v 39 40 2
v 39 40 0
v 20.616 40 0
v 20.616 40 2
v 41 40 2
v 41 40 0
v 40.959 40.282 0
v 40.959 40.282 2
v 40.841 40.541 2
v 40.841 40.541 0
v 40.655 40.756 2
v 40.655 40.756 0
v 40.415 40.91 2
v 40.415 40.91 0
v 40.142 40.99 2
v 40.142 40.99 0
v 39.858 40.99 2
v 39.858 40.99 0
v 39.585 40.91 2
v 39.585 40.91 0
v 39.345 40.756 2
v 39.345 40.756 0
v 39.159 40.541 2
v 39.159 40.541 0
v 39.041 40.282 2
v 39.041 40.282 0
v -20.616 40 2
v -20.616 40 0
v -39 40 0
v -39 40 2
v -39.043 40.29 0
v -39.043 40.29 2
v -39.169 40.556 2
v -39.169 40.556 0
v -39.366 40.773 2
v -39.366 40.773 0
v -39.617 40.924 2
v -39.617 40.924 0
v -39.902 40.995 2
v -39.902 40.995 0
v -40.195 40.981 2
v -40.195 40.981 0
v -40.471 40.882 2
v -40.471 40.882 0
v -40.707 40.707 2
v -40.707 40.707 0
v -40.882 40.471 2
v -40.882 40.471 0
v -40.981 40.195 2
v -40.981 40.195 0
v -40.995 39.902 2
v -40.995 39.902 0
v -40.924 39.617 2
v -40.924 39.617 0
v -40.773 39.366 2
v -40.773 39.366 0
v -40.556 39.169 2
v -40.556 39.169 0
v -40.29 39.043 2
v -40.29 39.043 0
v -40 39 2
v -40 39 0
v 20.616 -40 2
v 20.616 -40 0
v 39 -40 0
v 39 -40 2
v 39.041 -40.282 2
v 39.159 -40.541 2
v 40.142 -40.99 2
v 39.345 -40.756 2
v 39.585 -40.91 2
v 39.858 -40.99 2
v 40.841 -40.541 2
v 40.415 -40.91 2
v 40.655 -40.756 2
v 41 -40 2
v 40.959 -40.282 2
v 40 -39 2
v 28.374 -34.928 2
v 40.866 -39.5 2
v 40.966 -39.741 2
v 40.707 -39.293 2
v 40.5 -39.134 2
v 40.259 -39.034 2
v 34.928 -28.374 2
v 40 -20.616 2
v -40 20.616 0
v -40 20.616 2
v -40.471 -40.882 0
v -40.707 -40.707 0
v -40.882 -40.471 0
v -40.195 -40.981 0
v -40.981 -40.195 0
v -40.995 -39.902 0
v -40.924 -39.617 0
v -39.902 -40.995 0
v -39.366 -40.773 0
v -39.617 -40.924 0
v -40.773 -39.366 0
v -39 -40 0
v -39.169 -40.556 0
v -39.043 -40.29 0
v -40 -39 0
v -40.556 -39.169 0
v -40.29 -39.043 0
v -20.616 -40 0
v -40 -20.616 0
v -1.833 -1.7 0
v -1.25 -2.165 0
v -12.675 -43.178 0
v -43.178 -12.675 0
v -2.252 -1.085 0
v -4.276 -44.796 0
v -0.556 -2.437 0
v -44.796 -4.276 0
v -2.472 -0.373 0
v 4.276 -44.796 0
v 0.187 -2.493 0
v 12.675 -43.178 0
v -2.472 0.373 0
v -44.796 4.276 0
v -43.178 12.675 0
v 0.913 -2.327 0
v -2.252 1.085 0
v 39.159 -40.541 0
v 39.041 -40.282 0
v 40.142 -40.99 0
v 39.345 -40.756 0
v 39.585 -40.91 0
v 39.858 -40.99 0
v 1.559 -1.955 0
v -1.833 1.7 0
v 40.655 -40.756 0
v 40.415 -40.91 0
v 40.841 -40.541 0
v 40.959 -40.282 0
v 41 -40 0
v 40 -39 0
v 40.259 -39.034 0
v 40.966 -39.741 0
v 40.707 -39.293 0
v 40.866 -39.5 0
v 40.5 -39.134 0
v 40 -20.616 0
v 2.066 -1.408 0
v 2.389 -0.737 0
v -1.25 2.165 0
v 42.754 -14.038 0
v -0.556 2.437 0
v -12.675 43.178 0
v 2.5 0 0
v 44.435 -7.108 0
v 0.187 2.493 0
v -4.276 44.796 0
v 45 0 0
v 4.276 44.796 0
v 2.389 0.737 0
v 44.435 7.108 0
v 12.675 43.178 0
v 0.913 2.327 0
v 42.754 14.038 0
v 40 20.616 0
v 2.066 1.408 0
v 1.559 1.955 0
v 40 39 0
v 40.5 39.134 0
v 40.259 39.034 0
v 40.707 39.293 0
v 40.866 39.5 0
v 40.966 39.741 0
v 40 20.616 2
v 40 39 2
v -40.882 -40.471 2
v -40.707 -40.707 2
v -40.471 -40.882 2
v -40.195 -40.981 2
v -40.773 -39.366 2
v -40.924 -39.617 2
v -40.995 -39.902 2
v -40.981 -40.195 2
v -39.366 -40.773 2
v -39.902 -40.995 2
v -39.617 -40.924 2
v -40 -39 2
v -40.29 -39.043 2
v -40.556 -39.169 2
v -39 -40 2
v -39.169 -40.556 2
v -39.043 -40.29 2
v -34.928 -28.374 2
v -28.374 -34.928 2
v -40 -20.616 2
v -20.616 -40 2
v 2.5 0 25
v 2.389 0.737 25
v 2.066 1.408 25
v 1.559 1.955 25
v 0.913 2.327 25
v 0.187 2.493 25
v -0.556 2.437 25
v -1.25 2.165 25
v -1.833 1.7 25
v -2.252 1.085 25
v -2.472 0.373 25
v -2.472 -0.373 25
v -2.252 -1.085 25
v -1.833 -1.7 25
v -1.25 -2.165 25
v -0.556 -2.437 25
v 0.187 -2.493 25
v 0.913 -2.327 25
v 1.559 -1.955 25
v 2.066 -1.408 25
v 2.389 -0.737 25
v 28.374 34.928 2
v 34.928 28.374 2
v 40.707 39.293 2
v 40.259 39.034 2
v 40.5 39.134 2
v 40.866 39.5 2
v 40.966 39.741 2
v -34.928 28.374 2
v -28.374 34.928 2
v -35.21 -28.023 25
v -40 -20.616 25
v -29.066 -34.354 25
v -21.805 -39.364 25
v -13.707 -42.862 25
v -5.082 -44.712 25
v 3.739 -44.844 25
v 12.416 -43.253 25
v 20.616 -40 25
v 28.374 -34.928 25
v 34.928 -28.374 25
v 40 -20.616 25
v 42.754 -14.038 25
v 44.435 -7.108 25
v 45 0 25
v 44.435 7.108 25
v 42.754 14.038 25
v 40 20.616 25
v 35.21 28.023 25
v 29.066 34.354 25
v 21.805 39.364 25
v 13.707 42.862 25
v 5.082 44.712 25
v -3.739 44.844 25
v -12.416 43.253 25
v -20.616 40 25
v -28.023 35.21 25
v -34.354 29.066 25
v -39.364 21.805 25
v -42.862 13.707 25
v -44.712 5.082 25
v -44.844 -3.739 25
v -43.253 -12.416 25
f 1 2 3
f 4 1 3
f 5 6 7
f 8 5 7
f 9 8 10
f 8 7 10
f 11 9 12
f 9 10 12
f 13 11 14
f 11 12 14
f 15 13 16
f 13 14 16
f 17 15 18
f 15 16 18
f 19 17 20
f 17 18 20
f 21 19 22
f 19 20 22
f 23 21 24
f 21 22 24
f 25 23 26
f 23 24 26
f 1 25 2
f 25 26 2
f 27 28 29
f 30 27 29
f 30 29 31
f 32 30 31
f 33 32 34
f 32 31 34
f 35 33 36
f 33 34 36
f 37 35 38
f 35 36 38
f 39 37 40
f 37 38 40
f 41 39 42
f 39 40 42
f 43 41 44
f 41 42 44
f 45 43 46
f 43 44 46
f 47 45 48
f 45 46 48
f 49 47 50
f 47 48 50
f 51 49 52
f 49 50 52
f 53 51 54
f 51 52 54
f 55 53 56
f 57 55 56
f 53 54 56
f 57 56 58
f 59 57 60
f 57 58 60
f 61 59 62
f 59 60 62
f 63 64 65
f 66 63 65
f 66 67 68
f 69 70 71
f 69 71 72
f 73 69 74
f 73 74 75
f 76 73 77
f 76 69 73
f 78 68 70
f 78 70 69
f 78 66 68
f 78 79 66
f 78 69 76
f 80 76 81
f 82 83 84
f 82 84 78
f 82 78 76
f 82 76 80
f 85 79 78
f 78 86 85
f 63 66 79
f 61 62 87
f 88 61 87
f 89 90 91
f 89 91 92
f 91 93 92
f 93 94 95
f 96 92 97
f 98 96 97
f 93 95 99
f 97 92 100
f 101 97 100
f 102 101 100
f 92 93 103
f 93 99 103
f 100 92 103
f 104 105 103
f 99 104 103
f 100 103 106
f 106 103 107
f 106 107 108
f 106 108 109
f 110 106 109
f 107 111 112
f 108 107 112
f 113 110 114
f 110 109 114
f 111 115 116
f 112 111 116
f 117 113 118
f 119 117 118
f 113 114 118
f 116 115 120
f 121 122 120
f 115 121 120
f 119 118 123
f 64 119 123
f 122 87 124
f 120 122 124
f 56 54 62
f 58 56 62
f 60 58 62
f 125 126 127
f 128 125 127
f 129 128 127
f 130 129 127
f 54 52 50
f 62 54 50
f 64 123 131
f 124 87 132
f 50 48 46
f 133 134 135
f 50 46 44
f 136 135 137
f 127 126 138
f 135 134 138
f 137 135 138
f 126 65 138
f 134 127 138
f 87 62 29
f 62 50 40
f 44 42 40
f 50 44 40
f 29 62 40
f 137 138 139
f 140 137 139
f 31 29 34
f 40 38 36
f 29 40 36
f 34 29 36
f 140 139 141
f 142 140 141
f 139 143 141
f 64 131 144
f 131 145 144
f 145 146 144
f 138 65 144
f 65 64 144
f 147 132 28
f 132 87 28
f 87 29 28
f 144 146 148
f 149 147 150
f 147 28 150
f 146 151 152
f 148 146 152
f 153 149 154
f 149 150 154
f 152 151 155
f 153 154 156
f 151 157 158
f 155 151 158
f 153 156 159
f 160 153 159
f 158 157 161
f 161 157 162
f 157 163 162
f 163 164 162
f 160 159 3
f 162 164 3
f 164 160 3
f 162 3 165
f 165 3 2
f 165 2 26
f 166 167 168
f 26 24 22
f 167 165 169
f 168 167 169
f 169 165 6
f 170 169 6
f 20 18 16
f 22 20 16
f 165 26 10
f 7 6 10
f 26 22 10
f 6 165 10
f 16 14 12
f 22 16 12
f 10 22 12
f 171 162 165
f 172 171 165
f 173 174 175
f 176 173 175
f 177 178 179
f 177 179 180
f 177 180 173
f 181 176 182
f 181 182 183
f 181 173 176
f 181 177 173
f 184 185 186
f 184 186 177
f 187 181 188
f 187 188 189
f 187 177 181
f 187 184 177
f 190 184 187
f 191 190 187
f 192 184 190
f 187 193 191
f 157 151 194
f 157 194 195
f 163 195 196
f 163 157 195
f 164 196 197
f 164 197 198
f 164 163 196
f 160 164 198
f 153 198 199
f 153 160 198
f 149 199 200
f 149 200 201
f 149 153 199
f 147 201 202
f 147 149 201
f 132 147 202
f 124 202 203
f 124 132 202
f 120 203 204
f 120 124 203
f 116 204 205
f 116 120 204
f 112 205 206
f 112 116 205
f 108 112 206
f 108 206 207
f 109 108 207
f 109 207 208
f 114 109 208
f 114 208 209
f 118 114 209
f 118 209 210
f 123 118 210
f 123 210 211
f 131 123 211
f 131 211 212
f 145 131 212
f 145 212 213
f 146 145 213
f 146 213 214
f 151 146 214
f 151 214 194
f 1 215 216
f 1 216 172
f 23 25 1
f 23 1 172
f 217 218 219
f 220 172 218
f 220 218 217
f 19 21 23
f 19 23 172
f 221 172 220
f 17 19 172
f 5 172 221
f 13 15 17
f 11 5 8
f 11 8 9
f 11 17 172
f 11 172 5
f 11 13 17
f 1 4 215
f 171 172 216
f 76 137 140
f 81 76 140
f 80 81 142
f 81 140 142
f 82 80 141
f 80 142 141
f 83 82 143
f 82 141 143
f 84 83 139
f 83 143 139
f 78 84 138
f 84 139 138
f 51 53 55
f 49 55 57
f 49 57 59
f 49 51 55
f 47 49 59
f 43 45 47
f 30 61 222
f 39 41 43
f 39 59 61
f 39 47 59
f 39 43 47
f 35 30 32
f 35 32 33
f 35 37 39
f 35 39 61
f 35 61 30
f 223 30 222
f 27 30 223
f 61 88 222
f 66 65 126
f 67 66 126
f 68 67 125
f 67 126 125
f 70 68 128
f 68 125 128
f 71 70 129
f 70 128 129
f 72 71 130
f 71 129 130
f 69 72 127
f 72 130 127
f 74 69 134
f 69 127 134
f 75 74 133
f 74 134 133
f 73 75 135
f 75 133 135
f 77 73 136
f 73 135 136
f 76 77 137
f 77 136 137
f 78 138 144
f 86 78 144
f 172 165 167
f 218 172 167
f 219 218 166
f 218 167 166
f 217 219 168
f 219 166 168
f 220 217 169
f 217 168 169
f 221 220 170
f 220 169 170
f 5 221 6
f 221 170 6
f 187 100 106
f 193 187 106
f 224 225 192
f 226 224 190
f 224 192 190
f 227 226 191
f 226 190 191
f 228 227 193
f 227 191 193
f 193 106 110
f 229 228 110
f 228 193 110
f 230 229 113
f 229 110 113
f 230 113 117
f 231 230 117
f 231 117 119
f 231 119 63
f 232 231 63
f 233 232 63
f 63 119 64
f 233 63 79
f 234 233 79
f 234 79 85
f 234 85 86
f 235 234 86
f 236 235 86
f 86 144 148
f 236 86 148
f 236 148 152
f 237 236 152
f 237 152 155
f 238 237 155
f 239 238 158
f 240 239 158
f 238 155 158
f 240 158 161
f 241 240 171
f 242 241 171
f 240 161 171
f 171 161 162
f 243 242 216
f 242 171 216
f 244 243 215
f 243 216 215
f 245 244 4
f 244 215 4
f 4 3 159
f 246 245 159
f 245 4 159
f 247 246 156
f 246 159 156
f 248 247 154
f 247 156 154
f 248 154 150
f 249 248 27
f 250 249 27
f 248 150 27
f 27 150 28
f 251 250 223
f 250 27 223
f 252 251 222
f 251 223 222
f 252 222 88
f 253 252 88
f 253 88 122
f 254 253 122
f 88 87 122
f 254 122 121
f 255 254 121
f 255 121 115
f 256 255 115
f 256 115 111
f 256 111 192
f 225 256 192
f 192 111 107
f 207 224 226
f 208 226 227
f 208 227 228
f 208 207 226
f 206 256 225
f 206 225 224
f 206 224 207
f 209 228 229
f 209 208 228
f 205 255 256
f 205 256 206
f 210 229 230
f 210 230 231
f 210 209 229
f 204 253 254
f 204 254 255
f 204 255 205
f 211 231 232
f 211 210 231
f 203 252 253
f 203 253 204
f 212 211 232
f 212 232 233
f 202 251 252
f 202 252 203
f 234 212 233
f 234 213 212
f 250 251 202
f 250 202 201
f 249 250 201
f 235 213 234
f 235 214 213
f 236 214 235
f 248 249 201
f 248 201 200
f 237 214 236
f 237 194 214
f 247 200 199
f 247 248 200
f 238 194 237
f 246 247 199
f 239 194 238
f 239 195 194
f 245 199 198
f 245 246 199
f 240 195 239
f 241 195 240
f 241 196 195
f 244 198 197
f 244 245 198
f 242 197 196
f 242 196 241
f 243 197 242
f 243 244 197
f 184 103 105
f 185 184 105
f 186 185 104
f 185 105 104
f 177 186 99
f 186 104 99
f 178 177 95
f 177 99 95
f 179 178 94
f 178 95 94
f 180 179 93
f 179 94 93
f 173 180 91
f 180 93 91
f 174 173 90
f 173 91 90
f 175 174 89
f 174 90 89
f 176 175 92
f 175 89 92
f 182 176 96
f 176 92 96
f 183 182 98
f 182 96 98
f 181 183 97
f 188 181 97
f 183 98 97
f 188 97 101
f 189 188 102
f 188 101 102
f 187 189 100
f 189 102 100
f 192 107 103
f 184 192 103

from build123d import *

# Parameters (mm, degrees)
F0_R     = 2.5
F1_DEPTH = 2
F2_DEPTH = 25


# Not quite as in the source:
# - a feature names something its author has since deleted; it is built from what else it names


with BuildPart() as f1:
    # F0 (on Top) → F1 (new body)
    with BuildSketch(Plane.XY):
        with BuildLine():
            ThreePointArc((40, 39), (39.2928932188, 39.2928932188), (39, 40))
            Line((39, 40), (20.6155281281, 40))
            ThreePointArc((20.6155281281, 40), (31.8198051534, 31.8198051534), (40, 20.6155281281))
            Line((40, 20.6155281281), (40, 39))
        make_face()
        with BuildLine():
            ThreePointArc((-40, 20.6155281281), (-31.8198051534, 31.8198051534), (-20.6155281281, 40))
            Line((-20.6155281281, 40), (-39, 40))
            ThreePointArc((-39, 40), (-39.2928932188, 39.2928932188), (-40, 39))
            Line((-40, 39), (-40, 20.6155281281))
        make_face()
        with BuildLine():
            ThreePointArc((-20.6155281281, -40), (-31.8198051534, -31.8198051534), (-40, -20.6155281281))
            Line((-40, -20.6155281281), (-40, -39))
            ThreePointArc((-40, -39), (-39.2928932188, -39.2928932188), (-39, -40))
            Line((-39, -40), (-20.6155281281, -40))
        make_face()
        with BuildLine():
            Line((40, -39), (40, -20.6155281281))
            ThreePointArc((40, -20.6155281281), (31.8198051534, -31.8198051534), (20.6155281281, -40))
            Line((20.6155281281, -40), (39, -40))
            ThreePointArc((39, -40), (39.2928932188, -39.2928932188), (40, -39))
        make_face()
        with BuildLine():
            ThreePointArc((40, 20.6155281281), (31.8198051534, 31.8198051534), (20.6155281281, 40))
            ThreePointArc((20.6155281281, 40), (0, 45), (-20.6155281281, 40))
            ThreePointArc((-20.6155281281, 40), (-31.8198051534, 31.8198051534), (-40, 20.6155281281))
            ThreePointArc((-40, 20.6155281281), (-45, 0), (-40, -20.6155281281))
            ThreePointArc((-40, -20.6155281281), (-31.8198051534, -31.8198051534), (-20.6155281281, -40))
            ThreePointArc((-20.6155281281, -40), (0, -45), (20.6155281281, -40))
            ThreePointArc((20.6155281281, -40), (31.8198051534, -31.8198051534), (40, -20.6155281281))
            ThreePointArc((40, -20.6155281281), (43.7321392113, -10.6066017178), (45, 0))
            ThreePointArc((45, 0), (43.7321392113, 10.6066017178), (40, 20.6155281281))
        make_face()
        Circle(F0_R, mode=Mode.SUBTRACT)
        with BuildLine():
            Line((-40, 40), (-39, 40))
            ThreePointArc((-39, 40), (-40.7071067812, 40.7071067812), (-40, 39))
            Line((-40, 39), (-40, 40))
        make_face()
        with BuildLine():
            ThreePointArc((-40, 39), (-39.2928932188, 39.2928932188), (-39, 40))
            Line((-39, 40), (-40, 40))
            Line((-40, 40), (-40, 39))
        make_face()
        with BuildLine():
            Line((40, 40), (39, 40))
            ThreePointArc((39, 40), (39.2928932188, 39.2928932188), (40, 39))
            Line((40, 39), (40, 40))
        make_face()
        with BuildLine():
            ThreePointArc((40, 39), (40.7071067812, 39.2928932188), (41, 40))
            ThreePointArc((41, 40), (40, 41), (39, 40))
            Line((39, 40), (40, 40))
            Line((40, 40), (40, 39))
        make_face()
        with BuildLine():
            ThreePointArc((41, -40), (40.7071067812, -39.2928932188), (40, -39))
            Line((40, -39), (40, -40))
            Line((40, -40), (39, -40))
            ThreePointArc((39, -40), (40, -41), (41, -40))
        make_face()
        with BuildLine():
            Line((40, -40), (40, -39))
            ThreePointArc((40, -39), (39.2928932188, -39.2928932188), (39, -40))
            Line((39, -40), (40, -40))
        make_face()
        with BuildLine():
            Line((-40, -40), (-40, -39))
            ThreePointArc((-40, -39), (-40.7071067812, -40.7071067812), (-39, -40))
            Line((-39, -40), (-40, -40))
        make_face()
        with BuildLine():
            ThreePointArc((-39, -40), (-39.2928932188, -39.2928932188), (-40, -39))
            Line((-40, -39), (-40, -40))
            Line((-40, -40), (-39, -40))
        make_face()
    extrude(amount=F1_DEPTH)

    # F0 (on Top) → F2 (join)
    with BuildSketch(Plane.XY):
        with BuildLine():
            ThreePointArc((40, 20.6155281281), (31.8198051534, 31.8198051534), (20.6155281281, 40))
            ThreePointArc((20.6155281281, 40), (0, 45), (-20.6155281281, 40))
            ThreePointArc((-20.6155281281, 40), (-31.8198051534, 31.8198051534), (-40, 20.6155281281))
            ThreePointArc((-40, 20.6155281281), (-45, 0), (-40, -20.6155281281))
            ThreePointArc((-40, -20.6155281281), (-31.8198051534, -31.8198051534), (-20.6155281281, -40))
            ThreePointArc((-20.6155281281, -40), (0, -45), (20.6155281281, -40))
            ThreePointArc((20.6155281281, -40), (31.8198051534, -31.8198051534), (40, -20.6155281281))
            ThreePointArc((40, -20.6155281281), (43.7321392113, -10.6066017178), (45, 0))
            ThreePointArc((45, 0), (43.7321392113, 10.6066017178), (40, 20.6155281281))
        make_face()
        Circle(F0_R, mode=Mode.SUBTRACT)
    extrude(amount=F2_DEPTH)


solid = f1.part
